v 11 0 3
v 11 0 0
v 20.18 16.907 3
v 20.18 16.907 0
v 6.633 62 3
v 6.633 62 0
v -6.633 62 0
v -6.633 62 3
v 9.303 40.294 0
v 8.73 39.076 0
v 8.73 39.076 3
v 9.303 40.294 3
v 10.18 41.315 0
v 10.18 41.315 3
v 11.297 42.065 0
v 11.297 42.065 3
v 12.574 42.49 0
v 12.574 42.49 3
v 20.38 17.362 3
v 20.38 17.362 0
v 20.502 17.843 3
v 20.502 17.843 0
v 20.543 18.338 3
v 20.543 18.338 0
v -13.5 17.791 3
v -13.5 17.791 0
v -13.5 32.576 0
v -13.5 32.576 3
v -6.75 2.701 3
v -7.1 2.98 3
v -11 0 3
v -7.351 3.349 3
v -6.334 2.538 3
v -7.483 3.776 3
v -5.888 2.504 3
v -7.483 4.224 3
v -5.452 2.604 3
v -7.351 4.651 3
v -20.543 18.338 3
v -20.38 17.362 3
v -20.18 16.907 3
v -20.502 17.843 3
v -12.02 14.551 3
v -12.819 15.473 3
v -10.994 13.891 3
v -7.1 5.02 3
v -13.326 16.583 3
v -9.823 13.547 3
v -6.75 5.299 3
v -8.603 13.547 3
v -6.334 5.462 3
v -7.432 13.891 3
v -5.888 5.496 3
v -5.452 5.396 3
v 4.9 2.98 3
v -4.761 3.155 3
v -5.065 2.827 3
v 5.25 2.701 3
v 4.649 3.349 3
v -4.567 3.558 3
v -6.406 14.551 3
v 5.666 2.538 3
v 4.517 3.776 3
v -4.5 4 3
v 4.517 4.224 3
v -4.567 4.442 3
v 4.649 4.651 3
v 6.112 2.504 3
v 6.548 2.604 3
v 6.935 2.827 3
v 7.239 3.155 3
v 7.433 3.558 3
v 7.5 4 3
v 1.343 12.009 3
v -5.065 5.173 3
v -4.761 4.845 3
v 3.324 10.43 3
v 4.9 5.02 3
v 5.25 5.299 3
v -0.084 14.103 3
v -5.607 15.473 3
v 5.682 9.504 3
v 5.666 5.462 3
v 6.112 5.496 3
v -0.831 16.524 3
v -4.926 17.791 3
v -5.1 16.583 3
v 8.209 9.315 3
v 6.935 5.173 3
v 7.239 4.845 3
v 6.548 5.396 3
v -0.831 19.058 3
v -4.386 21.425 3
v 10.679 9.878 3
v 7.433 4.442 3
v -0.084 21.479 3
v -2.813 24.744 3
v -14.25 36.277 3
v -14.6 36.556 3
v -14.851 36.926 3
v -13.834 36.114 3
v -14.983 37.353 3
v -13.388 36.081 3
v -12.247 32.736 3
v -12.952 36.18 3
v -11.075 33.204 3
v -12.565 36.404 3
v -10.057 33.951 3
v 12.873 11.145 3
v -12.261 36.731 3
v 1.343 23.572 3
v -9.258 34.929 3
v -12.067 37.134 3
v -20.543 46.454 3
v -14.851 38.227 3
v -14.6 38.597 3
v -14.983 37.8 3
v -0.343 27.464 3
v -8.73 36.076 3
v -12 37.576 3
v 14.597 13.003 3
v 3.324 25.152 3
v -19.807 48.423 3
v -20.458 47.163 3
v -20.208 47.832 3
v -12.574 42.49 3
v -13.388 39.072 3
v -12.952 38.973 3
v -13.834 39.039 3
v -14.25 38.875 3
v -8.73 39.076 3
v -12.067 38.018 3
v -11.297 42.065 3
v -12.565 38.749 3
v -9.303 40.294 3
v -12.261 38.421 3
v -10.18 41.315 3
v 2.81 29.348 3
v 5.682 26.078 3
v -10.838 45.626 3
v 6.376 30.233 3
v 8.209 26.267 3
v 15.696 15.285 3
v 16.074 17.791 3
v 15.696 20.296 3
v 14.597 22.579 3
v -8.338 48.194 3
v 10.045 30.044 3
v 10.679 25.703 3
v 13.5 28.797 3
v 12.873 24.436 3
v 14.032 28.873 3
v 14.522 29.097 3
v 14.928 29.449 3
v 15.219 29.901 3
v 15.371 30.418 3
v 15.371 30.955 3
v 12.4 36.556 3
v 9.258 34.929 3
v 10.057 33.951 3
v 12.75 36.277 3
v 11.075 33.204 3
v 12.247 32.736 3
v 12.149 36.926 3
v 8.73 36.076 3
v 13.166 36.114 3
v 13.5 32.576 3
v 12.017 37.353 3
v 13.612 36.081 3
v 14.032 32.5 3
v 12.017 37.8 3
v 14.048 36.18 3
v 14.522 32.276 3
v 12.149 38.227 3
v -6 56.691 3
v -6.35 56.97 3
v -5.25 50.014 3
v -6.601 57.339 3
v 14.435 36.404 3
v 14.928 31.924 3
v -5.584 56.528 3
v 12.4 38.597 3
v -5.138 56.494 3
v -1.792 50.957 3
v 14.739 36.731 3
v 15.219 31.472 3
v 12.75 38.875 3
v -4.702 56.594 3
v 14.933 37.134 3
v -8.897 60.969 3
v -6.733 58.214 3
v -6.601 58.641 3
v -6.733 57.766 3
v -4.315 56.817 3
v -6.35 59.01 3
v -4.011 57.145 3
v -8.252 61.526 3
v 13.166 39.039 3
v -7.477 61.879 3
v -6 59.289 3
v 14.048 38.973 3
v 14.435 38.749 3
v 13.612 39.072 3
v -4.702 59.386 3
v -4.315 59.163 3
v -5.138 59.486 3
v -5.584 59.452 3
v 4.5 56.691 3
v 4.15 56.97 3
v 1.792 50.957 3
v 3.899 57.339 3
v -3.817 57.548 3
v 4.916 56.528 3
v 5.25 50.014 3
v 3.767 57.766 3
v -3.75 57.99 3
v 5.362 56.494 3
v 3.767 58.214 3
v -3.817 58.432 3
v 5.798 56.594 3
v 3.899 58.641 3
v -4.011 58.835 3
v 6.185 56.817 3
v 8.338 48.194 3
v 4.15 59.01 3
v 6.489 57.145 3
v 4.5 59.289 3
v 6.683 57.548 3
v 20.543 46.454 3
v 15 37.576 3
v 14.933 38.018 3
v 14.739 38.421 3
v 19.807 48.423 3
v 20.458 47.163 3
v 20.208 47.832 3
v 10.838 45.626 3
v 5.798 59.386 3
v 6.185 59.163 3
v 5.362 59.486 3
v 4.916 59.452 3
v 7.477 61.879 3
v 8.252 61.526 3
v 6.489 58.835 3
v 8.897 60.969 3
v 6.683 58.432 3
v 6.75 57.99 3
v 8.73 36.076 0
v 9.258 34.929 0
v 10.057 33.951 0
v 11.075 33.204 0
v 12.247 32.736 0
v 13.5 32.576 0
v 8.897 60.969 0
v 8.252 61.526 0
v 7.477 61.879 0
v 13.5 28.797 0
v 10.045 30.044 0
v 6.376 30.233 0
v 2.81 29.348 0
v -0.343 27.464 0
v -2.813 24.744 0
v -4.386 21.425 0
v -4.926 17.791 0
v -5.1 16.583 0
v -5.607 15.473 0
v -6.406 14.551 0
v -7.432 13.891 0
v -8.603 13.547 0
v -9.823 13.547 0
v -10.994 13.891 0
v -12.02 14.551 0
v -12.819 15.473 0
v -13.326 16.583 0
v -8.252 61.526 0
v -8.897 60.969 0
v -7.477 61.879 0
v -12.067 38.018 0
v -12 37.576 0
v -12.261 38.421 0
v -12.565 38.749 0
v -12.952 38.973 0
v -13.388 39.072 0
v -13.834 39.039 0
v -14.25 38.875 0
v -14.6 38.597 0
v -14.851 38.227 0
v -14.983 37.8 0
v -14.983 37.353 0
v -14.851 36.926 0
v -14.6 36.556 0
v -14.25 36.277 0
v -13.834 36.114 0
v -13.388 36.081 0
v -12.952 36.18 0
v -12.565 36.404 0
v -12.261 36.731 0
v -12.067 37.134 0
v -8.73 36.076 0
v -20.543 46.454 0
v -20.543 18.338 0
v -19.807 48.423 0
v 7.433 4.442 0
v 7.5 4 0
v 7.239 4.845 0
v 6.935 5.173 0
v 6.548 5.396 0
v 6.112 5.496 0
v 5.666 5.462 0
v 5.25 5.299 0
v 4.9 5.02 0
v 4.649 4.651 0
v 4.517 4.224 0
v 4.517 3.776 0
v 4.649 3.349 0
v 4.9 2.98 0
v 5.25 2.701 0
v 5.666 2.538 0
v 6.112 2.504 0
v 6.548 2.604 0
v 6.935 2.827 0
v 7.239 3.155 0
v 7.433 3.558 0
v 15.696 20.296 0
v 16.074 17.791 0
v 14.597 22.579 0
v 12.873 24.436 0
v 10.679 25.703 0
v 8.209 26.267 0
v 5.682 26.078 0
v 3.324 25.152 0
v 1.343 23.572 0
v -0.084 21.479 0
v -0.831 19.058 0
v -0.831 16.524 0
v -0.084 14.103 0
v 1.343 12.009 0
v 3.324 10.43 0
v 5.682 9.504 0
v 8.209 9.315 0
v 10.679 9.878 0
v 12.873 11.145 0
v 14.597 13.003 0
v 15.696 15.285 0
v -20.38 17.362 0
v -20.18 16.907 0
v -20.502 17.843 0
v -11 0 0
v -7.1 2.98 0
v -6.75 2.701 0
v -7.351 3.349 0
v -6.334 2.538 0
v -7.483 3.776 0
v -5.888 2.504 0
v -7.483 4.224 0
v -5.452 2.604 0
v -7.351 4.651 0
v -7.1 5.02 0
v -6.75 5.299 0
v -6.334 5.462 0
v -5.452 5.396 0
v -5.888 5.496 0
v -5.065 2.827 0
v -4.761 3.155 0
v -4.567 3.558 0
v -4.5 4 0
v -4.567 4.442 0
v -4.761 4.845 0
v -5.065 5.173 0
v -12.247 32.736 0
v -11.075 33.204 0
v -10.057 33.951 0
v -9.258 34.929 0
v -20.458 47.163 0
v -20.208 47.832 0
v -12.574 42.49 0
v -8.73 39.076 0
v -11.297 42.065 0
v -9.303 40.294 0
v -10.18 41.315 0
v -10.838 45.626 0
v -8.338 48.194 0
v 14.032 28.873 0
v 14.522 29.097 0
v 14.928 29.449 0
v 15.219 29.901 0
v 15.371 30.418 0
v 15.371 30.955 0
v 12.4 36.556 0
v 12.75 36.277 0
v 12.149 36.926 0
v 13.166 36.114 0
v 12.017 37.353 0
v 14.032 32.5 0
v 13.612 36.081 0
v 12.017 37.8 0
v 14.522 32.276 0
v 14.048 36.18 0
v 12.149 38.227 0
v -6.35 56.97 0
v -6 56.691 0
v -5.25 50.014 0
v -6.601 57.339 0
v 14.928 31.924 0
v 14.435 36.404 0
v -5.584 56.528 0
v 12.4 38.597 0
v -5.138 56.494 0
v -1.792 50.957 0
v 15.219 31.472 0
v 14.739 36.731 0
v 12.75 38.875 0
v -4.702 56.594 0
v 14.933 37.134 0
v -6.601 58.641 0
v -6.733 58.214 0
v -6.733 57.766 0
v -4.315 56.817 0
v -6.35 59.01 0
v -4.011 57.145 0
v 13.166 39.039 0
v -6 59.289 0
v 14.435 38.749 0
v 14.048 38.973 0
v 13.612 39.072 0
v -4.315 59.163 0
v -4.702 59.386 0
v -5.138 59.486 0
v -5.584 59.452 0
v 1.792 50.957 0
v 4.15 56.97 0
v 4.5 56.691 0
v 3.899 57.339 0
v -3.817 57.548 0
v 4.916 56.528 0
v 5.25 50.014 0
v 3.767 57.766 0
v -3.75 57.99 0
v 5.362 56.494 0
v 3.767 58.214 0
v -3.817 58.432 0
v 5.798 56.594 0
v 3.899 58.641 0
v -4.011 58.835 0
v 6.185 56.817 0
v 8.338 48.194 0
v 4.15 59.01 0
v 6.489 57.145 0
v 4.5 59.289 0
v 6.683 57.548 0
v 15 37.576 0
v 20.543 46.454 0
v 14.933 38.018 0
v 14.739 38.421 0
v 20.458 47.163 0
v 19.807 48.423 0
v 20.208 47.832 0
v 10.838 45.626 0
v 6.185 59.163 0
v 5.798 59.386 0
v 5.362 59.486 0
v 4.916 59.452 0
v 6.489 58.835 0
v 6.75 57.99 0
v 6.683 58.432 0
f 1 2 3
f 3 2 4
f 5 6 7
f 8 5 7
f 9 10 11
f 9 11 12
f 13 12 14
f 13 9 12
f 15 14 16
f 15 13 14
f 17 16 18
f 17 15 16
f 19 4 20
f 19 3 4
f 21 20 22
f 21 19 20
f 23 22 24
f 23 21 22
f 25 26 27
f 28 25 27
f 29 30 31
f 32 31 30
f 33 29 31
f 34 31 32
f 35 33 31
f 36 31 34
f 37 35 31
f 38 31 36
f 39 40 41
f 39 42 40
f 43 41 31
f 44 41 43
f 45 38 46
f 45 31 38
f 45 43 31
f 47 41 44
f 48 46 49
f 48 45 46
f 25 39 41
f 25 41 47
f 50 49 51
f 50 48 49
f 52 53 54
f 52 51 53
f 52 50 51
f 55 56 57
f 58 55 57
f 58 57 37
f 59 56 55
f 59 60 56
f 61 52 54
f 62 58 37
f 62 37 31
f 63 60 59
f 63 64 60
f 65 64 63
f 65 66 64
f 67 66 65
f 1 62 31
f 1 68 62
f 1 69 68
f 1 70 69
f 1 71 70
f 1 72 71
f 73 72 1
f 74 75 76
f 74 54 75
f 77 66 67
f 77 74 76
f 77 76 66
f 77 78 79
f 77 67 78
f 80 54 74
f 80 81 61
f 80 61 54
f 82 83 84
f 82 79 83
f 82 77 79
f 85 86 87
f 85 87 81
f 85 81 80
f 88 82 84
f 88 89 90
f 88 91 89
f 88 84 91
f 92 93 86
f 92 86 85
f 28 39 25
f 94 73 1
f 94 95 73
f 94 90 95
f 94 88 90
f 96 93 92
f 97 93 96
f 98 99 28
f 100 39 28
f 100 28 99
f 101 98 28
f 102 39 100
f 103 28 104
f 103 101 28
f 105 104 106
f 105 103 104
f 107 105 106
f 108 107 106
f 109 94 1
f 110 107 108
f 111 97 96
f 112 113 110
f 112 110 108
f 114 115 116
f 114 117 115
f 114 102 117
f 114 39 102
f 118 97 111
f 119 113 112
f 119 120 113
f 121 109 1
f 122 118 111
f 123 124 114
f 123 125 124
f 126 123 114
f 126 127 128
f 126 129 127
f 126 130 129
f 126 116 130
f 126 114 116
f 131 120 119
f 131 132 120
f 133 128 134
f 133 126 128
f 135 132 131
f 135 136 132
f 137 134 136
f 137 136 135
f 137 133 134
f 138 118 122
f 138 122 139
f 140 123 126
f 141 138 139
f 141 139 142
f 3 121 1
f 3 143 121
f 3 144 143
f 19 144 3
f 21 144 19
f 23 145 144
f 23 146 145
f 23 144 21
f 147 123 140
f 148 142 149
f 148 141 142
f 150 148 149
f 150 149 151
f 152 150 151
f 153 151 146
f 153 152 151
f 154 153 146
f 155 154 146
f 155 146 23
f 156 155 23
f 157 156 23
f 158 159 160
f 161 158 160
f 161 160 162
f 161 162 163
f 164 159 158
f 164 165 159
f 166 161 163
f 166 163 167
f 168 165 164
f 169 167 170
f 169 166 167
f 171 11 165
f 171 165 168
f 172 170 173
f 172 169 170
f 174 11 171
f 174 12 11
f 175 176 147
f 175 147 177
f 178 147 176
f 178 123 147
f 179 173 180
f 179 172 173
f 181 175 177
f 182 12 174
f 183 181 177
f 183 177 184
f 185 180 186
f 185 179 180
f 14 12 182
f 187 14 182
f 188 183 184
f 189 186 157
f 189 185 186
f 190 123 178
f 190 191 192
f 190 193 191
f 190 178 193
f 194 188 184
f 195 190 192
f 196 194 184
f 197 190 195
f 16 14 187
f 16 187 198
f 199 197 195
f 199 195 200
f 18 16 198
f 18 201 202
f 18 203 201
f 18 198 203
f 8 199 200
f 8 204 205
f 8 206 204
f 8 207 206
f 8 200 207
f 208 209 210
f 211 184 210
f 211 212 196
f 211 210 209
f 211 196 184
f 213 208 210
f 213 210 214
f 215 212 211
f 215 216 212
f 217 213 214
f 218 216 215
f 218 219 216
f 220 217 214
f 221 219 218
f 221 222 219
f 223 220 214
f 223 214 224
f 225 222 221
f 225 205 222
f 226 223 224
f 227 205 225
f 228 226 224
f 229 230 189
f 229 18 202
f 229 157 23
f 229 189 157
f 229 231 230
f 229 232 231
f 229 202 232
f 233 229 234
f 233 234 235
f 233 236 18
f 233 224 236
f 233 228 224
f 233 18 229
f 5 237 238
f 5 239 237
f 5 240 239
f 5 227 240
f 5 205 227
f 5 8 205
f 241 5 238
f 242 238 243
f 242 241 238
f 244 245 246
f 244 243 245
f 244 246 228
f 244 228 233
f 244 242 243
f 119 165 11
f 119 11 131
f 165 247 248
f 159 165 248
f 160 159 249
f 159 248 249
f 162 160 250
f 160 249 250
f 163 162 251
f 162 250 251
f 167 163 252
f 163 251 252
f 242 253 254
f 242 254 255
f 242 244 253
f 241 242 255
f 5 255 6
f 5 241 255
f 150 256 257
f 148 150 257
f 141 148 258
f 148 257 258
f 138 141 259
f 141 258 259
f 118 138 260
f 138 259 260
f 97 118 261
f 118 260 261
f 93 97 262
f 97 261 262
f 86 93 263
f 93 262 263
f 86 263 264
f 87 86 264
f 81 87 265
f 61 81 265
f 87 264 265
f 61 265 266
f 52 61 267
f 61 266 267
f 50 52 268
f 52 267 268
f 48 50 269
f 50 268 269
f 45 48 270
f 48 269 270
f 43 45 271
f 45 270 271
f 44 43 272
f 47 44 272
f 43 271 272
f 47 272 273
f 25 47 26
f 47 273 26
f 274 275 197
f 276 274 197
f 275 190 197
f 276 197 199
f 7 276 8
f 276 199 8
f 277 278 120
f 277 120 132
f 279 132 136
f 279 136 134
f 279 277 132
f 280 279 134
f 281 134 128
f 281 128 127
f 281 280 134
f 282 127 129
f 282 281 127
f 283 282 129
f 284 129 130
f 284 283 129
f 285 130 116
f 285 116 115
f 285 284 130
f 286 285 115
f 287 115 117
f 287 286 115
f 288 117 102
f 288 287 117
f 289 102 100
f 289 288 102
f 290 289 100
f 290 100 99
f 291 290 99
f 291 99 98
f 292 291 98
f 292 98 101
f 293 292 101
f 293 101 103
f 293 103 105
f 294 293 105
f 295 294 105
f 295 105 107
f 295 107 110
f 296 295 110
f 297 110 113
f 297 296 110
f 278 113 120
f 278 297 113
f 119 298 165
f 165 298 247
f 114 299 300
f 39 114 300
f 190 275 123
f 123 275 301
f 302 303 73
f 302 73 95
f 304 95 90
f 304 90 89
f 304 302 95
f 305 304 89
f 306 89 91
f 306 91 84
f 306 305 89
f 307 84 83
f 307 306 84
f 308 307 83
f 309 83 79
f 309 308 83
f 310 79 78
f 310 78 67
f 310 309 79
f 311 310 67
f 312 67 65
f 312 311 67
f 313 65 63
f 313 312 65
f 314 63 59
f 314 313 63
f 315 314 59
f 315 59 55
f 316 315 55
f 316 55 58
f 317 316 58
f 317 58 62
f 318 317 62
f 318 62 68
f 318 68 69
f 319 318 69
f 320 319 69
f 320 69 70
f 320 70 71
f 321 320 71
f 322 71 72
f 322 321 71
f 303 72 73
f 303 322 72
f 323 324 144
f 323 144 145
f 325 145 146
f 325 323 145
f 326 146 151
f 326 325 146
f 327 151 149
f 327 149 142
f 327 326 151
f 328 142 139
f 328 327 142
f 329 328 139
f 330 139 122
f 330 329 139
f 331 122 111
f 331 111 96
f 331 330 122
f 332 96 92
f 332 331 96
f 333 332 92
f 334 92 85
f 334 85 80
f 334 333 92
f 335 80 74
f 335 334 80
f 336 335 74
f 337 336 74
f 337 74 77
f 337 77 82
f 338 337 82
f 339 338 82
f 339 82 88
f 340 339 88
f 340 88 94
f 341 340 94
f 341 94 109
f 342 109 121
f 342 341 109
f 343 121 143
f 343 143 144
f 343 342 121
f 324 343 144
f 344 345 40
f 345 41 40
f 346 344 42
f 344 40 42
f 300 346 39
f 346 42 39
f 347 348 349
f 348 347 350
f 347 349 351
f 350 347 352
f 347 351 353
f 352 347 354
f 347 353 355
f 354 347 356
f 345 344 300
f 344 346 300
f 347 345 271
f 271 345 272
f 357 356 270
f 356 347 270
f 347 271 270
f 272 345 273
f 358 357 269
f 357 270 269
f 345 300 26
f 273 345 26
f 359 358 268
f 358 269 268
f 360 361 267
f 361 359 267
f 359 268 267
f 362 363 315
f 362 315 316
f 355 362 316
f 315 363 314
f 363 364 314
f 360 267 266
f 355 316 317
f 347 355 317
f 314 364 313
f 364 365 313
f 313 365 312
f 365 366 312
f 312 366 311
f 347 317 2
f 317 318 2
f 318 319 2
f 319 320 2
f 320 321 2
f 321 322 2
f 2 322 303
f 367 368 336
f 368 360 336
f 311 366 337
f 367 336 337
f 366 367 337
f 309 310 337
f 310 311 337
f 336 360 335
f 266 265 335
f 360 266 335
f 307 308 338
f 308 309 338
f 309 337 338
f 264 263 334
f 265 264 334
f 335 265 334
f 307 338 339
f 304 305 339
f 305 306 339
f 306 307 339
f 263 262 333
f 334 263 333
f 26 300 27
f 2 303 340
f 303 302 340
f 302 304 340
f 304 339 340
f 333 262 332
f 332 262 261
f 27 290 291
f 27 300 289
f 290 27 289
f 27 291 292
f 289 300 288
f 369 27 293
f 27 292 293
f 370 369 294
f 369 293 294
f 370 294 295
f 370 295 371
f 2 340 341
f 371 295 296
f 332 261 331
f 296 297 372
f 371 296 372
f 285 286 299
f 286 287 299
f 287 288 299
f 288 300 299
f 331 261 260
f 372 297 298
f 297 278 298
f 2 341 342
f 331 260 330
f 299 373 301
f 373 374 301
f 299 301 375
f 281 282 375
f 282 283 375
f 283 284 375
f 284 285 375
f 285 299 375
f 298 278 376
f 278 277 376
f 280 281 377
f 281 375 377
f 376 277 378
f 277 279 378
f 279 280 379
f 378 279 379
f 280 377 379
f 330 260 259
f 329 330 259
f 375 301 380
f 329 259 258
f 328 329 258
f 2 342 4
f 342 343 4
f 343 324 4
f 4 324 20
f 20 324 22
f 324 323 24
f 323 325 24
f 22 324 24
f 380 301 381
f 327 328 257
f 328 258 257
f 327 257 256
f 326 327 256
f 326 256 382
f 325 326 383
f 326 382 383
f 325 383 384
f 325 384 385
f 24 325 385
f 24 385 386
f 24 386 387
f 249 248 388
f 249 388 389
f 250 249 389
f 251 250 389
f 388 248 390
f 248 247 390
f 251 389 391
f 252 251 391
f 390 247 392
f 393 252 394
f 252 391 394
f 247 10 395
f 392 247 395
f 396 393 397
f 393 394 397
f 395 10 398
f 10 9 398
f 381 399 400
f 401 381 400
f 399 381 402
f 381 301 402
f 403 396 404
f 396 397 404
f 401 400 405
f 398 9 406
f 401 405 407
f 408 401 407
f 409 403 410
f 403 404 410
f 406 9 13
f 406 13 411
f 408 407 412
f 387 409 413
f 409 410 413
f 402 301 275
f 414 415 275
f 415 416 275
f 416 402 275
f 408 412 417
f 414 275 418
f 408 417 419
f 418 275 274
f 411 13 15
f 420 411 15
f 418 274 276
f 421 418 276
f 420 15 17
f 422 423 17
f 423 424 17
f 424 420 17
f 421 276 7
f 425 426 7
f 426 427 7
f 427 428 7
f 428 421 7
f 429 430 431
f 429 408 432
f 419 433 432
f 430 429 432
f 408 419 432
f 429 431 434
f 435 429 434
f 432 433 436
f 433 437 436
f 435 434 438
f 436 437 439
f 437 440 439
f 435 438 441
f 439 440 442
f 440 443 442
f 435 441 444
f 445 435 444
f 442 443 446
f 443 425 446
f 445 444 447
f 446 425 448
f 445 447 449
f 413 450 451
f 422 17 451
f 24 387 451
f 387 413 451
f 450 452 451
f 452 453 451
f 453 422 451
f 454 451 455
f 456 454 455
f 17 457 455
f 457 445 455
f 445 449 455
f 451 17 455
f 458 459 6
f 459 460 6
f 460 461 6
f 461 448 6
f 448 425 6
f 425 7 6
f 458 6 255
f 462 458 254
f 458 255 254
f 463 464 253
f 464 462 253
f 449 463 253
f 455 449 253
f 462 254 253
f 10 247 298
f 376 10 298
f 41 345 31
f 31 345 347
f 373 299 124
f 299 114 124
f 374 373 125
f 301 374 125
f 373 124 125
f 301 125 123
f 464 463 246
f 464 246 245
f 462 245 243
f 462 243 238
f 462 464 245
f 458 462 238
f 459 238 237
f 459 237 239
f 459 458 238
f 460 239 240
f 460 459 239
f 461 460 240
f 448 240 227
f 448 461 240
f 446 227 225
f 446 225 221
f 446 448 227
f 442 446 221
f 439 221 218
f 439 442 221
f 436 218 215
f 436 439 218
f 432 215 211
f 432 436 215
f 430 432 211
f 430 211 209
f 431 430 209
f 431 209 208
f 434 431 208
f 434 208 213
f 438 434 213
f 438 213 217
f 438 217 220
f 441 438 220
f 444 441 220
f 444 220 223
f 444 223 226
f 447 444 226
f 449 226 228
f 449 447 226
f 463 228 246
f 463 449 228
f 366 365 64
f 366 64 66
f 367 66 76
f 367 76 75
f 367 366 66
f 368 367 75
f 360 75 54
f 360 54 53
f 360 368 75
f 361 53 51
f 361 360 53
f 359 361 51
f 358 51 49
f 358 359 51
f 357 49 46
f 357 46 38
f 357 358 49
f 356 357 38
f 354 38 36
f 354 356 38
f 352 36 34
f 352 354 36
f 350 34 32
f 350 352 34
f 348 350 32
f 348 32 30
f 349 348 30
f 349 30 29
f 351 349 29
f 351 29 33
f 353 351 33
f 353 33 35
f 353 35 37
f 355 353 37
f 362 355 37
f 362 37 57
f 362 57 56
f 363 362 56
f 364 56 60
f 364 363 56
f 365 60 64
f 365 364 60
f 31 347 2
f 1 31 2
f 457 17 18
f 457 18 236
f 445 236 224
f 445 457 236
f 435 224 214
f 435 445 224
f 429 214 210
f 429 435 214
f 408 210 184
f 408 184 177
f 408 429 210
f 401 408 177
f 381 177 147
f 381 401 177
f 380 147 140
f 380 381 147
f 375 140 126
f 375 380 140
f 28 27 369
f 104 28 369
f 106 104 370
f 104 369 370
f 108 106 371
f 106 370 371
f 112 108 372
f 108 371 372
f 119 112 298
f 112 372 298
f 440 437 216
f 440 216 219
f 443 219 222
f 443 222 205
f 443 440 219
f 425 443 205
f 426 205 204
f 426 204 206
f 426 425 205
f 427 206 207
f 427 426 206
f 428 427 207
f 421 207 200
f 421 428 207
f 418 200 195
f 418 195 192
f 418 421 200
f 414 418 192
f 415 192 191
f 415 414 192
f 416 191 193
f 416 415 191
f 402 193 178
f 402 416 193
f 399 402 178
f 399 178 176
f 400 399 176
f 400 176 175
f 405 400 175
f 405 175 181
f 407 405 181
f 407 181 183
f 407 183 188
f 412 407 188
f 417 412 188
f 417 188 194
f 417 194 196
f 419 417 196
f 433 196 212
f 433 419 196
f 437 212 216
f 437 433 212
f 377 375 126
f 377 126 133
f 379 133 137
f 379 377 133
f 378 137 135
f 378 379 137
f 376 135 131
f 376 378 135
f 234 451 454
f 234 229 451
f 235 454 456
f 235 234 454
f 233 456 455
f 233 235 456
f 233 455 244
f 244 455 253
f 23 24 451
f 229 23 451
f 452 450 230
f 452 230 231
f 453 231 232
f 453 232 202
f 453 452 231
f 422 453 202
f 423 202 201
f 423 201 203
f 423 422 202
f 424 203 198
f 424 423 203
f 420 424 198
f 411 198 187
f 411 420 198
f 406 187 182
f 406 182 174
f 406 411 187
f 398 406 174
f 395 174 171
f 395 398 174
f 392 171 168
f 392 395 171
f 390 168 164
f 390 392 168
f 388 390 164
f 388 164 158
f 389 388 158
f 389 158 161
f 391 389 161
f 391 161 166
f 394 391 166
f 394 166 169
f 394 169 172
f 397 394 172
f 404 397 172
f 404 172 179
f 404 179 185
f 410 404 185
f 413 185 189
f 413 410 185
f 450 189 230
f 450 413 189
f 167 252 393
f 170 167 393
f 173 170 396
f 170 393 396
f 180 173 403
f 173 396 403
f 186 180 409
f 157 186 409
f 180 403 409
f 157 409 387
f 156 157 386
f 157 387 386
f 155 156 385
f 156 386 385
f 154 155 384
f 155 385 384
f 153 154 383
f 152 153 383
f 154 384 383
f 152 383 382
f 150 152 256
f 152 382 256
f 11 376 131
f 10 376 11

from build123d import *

# Parameters (mm, degrees)
IZIM3_R                     = 1.5
IZIM3_R_2                   = 8.5
Y_KSEKLIK_EKSTR_ZYON1_DEPTH = 3
RADYUS1_R                   = 3


with BuildPart() as part:
    # Çizim3 → Yükseklik-Ekstrüzyon1 (new body)
    with BuildSketch(Plane.XY):
        Polygon((-11, 0), (11, 0), (20.543175205, 17.576342253), (20.543175205, 47.576342253), (8, 62), (-8, 62), (-20.543175205, 47.576342253), (-20.543175205, 17.576342253), align=None)
        with Locations((-6, 4)):
            Circle(IZIM3_R, mode=Mode.SUBTRACT)
        with Locations((6, 4)):
            Circle(IZIM3_R, mode=Mode.SUBTRACT)
        with Locations((-5.25, 57.99)):
            Circle(IZIM3_R, mode=Mode.SUBTRACT)
        with Locations((5.25, 57.99)):
            Circle(IZIM3_R, mode=Mode.SUBTRACT)
        with Locations((-13.5, 37.576342253)):
            Circle(IZIM3_R, mode=Mode.SUBTRACT)
        with Locations((13.5, 37.576342253)):
            Circle(IZIM3_R, mode=Mode.SUBTRACT)
        with Locations((7.573825848, 17.79076532)):
            Circle(IZIM3_R_2, mode=Mode.SUBTRACT)
        with BuildLine():
            Line((-8.730303993, 36.076342253), (8.730303993, 36.076342253))
            ThreePointArc((8.730303993, 36.076342253), (10.541960108, 33.545213379), (13.5, 32.576342253))
            ThreePointArc((13.5, 32.576342253), (15.389824267, 30.686517986), (13.5, 28.796693719))
            ThreePointArc((13.5, 28.796693719), (1.163957554, 28.522195255), (-4.926174152, 17.79076532))
            ThreePointArc((-4.926174152, 17.79076532), (-9.213087076, 13.503852396), (-13.5, 17.79076532))
            Line((-13.5, 17.79076532), (-13.5, 32.576342253))
            ThreePointArc((-13.5, 32.576342253), (-10.541960108, 33.545213379), (-8.730303993, 36.076342253))
        make_face(mode=Mode.SUBTRACT)
        with BuildLine():
            Line((-8.730303993, 39.076342253), (8.730303993, 39.076342253))
            ThreePointArc((8.730303993, 39.076342253), (10.179901517, 41.314917658), (12.574074074, 42.489860461))
            ThreePointArc((12.574074074, 42.489860461), (0, 51.076342253), (-12.574074074, 42.489860461))
            ThreePointArc((-12.574074074, 42.489860461), (-10.179901517, 41.314917658), (-8.730303993, 39.076342253))
        make_face(mode=Mode.SUBTRACT)
    extrude(amount=Y_KSEKLIK_EKSTR_ZYON1_DEPTH)

    # Radyus1
    radyus1_edges = [part.edges().sort_by_distance(p)[0] for p in [
        (-8, 62, 1.5),
        (8, 62, 1.5),
        (20.543175205, 47.576342253, 1.5),
        (20.543175205, 17.576342253, 1.5),
        (-20.543175205, 17.576342253, 1.5),
        (-20.543175205, 47.576342253, 1.5),
    ]]
    fillet(radyus1_edges, radius=RADYUS1_R)


solid = part.part
